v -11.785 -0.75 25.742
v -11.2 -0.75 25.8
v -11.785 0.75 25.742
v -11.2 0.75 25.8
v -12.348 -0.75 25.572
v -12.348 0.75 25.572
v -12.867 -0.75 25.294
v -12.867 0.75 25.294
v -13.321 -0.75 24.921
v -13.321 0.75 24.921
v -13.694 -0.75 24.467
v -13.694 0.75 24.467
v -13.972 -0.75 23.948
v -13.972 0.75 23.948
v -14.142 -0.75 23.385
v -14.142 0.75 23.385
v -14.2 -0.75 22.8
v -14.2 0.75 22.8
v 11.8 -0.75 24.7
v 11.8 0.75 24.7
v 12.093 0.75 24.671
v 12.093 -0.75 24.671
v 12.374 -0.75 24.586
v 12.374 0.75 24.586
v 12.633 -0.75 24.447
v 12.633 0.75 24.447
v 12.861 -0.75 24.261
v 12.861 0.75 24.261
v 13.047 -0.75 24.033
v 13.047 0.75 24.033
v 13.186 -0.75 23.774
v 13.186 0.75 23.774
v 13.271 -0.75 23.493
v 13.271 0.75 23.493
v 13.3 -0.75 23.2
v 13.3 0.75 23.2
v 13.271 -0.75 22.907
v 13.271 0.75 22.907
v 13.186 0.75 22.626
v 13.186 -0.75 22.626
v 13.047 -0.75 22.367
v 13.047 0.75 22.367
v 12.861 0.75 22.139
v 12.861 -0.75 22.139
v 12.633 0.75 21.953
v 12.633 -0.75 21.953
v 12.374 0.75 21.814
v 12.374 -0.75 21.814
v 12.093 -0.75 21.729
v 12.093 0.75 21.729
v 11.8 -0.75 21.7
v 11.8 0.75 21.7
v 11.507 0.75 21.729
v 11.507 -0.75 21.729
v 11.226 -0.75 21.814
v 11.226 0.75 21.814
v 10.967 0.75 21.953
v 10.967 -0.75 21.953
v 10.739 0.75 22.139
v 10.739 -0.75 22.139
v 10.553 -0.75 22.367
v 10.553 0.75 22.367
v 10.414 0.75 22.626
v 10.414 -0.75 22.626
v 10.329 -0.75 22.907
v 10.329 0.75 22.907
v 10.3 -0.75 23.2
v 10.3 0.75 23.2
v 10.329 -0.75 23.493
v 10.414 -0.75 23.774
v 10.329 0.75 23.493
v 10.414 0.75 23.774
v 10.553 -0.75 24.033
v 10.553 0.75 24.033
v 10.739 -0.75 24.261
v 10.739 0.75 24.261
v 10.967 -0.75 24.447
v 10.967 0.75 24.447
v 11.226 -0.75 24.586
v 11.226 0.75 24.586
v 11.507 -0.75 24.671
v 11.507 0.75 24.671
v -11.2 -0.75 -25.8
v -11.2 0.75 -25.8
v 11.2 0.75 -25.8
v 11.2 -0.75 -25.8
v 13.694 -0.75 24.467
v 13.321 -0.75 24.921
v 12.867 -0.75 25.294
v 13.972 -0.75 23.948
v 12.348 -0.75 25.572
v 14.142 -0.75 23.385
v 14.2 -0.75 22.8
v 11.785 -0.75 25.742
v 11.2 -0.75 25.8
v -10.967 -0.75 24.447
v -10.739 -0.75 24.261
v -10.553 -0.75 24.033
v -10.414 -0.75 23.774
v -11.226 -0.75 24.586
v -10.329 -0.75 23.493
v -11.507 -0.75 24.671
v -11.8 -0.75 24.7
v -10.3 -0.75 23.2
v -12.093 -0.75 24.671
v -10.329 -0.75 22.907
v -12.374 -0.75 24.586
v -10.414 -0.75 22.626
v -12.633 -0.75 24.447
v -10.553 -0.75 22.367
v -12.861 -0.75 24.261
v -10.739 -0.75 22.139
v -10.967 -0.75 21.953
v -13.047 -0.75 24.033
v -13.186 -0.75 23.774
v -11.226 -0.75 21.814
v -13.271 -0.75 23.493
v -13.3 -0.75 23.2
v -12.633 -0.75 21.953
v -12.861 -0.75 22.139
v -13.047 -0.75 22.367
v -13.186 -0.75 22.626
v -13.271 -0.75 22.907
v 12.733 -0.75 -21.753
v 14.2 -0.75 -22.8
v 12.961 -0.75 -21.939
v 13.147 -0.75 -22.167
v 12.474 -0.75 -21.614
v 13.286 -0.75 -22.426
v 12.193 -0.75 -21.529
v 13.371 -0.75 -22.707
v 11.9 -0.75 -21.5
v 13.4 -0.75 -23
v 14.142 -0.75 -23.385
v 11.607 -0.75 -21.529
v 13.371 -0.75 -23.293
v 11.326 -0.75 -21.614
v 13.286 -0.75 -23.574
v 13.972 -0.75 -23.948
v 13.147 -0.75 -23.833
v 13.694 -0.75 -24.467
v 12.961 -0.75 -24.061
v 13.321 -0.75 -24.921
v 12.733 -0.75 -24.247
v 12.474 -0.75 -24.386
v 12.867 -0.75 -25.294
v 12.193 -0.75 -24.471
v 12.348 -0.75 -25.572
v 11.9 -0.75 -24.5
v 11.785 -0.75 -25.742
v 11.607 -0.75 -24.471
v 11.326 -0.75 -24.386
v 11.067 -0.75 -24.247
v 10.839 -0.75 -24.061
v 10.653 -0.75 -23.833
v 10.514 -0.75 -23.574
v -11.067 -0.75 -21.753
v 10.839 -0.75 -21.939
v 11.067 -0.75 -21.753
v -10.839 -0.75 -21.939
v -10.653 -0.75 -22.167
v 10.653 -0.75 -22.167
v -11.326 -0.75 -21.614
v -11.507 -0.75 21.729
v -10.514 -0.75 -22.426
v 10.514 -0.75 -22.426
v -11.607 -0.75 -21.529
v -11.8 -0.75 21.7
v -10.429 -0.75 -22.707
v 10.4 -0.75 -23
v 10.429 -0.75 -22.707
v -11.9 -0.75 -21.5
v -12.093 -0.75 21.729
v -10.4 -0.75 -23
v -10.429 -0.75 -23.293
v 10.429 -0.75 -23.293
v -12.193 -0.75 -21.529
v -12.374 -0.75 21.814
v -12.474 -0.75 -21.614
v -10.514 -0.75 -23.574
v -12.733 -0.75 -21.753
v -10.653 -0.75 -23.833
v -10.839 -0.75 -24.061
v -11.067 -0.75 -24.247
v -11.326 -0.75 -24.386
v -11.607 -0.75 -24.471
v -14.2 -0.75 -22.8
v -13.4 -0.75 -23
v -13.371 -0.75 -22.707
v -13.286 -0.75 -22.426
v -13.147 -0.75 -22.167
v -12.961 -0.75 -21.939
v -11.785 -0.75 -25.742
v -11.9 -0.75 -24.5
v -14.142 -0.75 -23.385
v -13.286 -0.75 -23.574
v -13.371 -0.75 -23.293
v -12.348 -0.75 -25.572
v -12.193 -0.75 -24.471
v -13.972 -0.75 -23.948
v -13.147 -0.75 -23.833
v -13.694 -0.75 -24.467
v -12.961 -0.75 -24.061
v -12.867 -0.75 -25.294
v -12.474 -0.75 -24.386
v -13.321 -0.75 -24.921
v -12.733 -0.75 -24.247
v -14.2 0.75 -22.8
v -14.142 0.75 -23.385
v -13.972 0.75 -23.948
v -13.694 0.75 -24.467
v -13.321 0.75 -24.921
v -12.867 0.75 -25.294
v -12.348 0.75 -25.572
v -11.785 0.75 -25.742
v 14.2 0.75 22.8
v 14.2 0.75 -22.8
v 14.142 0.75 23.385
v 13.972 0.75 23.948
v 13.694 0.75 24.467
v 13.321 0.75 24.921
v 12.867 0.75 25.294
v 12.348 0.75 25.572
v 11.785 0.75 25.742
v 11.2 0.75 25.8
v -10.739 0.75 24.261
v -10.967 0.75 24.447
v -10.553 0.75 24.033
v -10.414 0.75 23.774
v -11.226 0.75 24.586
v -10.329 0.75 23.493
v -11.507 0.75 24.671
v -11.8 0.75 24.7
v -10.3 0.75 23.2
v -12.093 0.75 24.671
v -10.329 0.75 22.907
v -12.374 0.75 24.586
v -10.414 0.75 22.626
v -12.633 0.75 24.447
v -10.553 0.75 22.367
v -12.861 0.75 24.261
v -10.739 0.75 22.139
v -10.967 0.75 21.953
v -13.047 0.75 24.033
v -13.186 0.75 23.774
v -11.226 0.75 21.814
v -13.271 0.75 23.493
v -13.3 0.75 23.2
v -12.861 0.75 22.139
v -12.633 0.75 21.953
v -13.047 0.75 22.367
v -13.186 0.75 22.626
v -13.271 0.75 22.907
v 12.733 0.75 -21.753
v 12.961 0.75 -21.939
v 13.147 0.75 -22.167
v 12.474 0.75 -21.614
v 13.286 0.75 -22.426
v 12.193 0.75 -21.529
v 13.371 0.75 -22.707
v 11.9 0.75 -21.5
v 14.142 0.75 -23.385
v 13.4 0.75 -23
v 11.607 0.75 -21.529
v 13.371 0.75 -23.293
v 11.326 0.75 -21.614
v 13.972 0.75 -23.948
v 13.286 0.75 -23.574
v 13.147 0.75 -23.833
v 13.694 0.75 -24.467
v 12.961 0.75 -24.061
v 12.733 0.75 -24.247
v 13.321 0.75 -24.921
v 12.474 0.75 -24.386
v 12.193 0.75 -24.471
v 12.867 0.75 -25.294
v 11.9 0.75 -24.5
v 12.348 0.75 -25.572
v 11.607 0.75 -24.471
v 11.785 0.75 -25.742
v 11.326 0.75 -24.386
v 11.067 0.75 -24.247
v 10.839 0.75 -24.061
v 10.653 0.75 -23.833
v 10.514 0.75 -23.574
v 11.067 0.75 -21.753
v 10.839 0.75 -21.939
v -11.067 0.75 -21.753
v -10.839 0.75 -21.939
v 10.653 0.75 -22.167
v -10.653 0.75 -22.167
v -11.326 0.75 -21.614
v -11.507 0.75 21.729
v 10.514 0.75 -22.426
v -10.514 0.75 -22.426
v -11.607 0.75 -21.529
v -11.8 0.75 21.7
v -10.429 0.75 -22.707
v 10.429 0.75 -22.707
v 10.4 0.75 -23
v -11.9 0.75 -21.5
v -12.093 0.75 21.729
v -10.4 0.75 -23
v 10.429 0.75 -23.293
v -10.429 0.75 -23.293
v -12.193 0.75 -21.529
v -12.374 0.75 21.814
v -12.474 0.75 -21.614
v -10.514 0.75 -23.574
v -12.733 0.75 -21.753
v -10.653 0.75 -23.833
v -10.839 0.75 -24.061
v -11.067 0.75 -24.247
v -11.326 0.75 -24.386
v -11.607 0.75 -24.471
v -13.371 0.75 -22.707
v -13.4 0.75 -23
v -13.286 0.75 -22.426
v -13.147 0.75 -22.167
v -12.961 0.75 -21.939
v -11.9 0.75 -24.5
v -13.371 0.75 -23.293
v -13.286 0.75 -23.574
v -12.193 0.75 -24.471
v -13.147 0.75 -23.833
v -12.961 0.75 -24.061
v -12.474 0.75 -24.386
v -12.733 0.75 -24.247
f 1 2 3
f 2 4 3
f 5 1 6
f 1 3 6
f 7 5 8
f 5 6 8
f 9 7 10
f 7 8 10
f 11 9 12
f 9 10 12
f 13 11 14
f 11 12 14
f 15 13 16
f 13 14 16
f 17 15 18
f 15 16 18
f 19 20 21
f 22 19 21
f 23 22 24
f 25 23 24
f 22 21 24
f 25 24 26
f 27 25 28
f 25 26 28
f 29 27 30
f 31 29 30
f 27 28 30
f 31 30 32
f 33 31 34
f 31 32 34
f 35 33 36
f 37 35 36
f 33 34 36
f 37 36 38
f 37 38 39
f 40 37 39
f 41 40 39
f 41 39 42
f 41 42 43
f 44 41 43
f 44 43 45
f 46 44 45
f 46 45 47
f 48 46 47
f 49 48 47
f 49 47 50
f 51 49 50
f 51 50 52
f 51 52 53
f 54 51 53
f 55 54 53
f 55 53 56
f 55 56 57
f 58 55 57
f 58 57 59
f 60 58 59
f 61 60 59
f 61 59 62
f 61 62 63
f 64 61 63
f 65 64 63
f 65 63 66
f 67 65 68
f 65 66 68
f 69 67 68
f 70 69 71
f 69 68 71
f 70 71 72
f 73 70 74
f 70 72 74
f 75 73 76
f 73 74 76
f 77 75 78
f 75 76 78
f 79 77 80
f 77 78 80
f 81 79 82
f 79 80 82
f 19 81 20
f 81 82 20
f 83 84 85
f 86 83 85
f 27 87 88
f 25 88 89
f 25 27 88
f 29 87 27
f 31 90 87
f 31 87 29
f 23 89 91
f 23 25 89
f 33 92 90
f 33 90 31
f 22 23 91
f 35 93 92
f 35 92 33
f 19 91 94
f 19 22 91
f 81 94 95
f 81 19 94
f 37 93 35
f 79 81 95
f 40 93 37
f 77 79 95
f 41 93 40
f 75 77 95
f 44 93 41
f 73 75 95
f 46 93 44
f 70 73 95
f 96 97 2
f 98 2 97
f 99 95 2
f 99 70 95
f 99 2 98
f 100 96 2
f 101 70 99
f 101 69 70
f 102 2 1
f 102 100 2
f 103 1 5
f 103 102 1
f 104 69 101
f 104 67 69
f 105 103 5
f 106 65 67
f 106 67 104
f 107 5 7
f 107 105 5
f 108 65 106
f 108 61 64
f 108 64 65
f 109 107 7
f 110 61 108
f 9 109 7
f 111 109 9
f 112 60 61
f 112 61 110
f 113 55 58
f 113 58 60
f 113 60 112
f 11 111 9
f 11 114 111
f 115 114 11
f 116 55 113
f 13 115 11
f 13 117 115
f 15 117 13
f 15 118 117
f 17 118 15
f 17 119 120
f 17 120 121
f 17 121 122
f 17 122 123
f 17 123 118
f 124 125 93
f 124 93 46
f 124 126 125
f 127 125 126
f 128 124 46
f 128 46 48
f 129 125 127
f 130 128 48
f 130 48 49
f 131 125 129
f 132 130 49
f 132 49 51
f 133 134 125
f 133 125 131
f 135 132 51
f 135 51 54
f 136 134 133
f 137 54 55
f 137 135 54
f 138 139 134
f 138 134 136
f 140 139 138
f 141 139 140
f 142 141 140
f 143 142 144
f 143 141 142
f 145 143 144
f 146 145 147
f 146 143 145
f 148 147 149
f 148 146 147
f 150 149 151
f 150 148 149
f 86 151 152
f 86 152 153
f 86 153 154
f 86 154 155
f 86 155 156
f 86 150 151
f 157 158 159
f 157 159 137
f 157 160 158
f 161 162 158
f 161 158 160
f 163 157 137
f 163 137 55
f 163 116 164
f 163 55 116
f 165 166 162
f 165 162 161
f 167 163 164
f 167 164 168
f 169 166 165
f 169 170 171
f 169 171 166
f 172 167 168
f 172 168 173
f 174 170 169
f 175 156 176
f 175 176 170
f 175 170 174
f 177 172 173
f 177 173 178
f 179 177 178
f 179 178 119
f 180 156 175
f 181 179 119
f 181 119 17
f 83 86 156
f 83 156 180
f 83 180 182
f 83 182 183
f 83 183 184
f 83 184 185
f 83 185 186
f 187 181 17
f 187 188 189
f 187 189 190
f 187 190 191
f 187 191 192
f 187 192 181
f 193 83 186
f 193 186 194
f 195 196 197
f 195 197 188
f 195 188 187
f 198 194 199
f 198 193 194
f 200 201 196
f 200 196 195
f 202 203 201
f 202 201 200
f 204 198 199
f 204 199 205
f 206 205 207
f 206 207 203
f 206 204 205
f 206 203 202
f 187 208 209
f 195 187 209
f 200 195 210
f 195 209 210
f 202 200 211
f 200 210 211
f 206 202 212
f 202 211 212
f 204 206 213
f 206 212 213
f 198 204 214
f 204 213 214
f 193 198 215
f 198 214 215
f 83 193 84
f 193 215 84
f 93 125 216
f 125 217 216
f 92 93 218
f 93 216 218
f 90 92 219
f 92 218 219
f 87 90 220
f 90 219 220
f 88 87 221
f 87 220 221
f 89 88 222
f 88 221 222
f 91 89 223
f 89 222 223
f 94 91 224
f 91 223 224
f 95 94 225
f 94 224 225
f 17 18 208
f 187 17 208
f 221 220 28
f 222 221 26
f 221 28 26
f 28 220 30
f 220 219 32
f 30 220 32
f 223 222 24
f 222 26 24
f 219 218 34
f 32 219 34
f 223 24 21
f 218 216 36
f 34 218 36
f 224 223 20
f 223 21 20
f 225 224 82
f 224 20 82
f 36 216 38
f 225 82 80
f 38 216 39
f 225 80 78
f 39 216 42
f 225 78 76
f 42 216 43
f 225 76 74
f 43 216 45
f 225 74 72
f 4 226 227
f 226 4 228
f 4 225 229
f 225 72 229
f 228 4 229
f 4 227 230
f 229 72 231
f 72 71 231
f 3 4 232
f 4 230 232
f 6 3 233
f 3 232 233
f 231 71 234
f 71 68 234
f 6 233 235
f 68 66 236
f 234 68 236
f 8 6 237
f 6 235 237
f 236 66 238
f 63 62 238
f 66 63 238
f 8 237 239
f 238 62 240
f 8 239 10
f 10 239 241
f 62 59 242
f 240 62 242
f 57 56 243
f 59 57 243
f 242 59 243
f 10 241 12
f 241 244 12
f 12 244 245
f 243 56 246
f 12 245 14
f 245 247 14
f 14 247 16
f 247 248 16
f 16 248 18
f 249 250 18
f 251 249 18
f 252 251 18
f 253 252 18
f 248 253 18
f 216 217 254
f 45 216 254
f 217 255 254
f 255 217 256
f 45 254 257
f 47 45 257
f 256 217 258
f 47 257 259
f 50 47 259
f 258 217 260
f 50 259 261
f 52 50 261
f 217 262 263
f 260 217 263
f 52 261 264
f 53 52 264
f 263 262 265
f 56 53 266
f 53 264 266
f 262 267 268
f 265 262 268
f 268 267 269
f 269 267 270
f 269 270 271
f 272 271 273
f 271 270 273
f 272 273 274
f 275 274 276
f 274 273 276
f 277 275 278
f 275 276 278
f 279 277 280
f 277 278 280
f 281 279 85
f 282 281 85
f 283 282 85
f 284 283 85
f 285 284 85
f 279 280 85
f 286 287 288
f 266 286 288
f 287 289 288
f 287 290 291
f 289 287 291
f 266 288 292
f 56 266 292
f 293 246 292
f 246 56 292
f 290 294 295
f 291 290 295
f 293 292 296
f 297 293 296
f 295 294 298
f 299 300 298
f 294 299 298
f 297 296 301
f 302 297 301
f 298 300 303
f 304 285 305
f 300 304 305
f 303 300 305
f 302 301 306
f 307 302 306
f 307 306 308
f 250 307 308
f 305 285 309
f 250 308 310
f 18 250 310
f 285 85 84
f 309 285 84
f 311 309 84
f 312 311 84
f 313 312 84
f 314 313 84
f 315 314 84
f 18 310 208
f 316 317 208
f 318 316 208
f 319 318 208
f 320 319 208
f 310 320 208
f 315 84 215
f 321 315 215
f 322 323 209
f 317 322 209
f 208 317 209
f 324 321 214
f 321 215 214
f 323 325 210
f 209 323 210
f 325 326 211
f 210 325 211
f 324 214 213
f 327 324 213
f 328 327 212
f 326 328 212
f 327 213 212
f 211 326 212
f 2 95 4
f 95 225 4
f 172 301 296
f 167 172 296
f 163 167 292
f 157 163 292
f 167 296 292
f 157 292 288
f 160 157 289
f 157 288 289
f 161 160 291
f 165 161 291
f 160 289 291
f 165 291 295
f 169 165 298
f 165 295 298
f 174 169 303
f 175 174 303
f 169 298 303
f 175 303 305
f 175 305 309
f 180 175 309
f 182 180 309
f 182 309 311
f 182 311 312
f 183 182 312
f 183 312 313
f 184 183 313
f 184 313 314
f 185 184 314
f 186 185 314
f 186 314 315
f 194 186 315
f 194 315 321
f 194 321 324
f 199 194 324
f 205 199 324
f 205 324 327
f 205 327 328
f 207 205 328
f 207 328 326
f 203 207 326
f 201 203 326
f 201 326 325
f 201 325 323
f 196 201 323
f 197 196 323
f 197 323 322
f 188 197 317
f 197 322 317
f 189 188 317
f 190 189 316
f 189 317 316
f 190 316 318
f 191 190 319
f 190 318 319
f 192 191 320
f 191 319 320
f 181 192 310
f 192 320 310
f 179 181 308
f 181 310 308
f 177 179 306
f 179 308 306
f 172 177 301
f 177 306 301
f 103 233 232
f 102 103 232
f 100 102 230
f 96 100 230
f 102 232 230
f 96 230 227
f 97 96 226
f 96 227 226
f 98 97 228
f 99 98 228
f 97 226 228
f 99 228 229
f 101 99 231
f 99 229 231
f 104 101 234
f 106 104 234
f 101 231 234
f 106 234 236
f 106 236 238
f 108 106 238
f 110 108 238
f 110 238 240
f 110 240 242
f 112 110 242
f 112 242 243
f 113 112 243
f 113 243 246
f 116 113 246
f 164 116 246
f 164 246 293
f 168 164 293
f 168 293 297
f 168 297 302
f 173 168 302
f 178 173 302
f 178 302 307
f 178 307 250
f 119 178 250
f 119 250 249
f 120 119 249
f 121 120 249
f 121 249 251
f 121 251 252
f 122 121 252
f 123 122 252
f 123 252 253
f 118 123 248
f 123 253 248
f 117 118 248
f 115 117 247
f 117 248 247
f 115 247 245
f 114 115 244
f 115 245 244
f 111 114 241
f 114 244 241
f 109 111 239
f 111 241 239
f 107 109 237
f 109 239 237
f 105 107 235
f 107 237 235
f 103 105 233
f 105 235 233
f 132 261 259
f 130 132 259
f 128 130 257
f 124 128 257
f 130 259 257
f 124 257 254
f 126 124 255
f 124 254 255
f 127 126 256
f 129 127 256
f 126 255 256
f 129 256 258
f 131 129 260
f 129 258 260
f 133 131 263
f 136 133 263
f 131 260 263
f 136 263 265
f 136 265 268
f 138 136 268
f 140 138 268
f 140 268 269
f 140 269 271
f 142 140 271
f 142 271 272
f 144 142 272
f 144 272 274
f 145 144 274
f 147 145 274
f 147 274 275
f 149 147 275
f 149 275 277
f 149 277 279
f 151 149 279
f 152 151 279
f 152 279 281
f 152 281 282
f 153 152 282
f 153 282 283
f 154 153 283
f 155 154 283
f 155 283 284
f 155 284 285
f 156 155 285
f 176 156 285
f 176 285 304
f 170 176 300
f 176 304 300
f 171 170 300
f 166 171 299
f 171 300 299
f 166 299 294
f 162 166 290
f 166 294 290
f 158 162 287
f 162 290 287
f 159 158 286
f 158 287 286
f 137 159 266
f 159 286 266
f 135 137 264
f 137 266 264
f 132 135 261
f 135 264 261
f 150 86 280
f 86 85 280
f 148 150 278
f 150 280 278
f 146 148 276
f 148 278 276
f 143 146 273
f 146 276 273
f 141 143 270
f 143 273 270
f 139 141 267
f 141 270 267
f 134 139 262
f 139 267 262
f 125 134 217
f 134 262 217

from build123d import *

# Parameters (mm, degrees)
BOSS_EXTRUDE1_DEPTH = 0.75
CUT_EXTRUDE1_REACH  = 31.488
SKETCH3_R           = 1.5


with BuildPart() as part:
    # Sketch1 → Boss-Extrude1 (new, symmetric)
    with BuildSketch(Plane(origin=(0, 0, 0), x_dir=(1, 0, 0), z_dir=(0, 1, 0))):
        with BuildLine():
            Line((-11.2, 25.8), (11.2, 25.8))
            ThreePointArc((11.2, 25.8), (13.321320344, 24.921320344), (14.2, 22.8))
            Line((14.2, 22.8), (14.2, -22.8))
            ThreePointArc((14.2, -22.8), (13.321320344, -24.921320344), (11.2, -25.8))
            Line((11.2, -25.8), (-11.2, -25.8))
            ThreePointArc((-11.2, -25.8), (-13.321320344, -24.921320344), (-14.2, -22.8))
            Line((-14.2, -22.8), (-14.2, 22.8))
            ThreePointArc((-14.2, 22.8), (-13.321320344, 24.921320344), (-11.2, 25.8))
        make_face()
    extrude(amount=BOSS_EXTRUDE1_DEPTH, both=True)

    # Sketch3 → Cut-Extrude1 (cut, up to next)
    with BuildSketch(Plane(origin=(0, 0.75, 0), x_dir=(1, 0, 0), z_dir=(0, 1, 0)), mode=Mode.PRIVATE) as cut_extrude1_sk1:
        with Locations(Location((11.9, 23, 0), (0, 0, 270))):
            Circle(SKETCH3_R)
    cut_extrude1_tool1 = extrude(cut_extrude1_sk1.sketch, amount=-CUT_EXTRUDE1_REACH, mode=Mode.PRIVATE) & part.part
    # Sketch3 → Cut-Extrude1 (cut, up to next)
    with BuildSketch(Plane(origin=(0, 0.75, 0), x_dir=(1, 0, 0), z_dir=(0, 1, 0)), mode=Mode.PRIVATE) as cut_extrude1_sk2:
        with Locations(Location((-11.9, 23, 0), (0, 0, 270))):
            Circle(SKETCH3_R)
    cut_extrude1_tool2 = extrude(cut_extrude1_sk2.sketch, amount=-CUT_EXTRUDE1_REACH, mode=Mode.PRIVATE) & part.part
    # Sketch3 → Cut-Extrude1 (cut, up to next)
    with BuildSketch(Plane(origin=(0, 0.75, 0), x_dir=(1, 0, 0), z_dir=(0, 1, 0)), mode=Mode.PRIVATE) as cut_extrude1_sk3:
        with Locations(Location((11.8, -23.2, 0), (0, 0, 270))):
            Circle(SKETCH3_R)
    cut_extrude1_tool3 = extrude(cut_extrude1_sk3.sketch, amount=-CUT_EXTRUDE1_REACH, mode=Mode.PRIVATE) & part.part
    # Sketch3 → Cut-Extrude1 (cut, up to next)
    with BuildSketch(Plane(origin=(0, 0.75, 0), x_dir=(1, 0, 0), z_dir=(0, 1, 0)), mode=Mode.PRIVATE) as cut_extrude1_sk4:
        with Locations(Location((-11.8, -23.2, 0), (0, 0, 270))):
            Circle(SKETCH3_R)
    cut_extrude1_tool4 = extrude(cut_extrude1_sk4.sketch, amount=-CUT_EXTRUDE1_REACH, mode=Mode.PRIVATE) & part.part
    add(cut_extrude1_tool1.solids().sort_by_distance((11.9, 0.75, -23))[0], mode=Mode.SUBTRACT)
    add(cut_extrude1_tool2.solids().sort_by_distance((-11.9, 0.75, -23))[0], mode=Mode.SUBTRACT)
    add(cut_extrude1_tool3.solids().sort_by_distance((11.8, 0.75, 23.2))[0], mode=Mode.SUBTRACT)
    add(cut_extrude1_tool4.solids().sort_by_distance((-11.8, 0.75, 23.2))[0], mode=Mode.SUBTRACT)


solid = part.part
